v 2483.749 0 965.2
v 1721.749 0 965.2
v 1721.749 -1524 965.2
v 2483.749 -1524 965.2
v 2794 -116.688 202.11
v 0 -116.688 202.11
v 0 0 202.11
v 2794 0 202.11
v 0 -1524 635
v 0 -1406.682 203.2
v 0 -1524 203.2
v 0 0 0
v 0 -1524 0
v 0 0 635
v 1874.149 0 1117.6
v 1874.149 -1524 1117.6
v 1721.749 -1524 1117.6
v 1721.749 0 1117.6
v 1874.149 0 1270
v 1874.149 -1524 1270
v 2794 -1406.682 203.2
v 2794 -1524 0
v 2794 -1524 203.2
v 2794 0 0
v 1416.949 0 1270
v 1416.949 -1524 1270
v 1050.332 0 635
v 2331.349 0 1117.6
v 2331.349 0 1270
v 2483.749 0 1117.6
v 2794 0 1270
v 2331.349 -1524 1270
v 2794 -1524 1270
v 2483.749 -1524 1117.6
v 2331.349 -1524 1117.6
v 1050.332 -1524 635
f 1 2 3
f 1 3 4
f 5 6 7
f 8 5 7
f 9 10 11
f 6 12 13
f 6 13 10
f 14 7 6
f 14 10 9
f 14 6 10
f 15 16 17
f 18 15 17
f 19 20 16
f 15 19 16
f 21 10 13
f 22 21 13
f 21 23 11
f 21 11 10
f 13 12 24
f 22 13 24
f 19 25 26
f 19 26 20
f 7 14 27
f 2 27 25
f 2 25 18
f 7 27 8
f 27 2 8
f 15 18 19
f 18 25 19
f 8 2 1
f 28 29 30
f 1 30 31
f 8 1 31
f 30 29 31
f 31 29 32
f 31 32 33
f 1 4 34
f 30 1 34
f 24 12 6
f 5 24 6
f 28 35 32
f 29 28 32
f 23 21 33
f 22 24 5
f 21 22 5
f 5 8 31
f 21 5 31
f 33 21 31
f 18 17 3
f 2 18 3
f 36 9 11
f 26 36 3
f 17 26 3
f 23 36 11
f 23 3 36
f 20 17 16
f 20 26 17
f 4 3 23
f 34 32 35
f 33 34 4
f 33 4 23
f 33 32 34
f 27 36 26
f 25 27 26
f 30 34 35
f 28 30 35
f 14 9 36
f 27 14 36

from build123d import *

# Parameters (mm, degrees)
F0_W     = 2794
F0_H     = 1270
F1_DEPTH = 1524
F3_DEPTH = 1524.001
F5_DEPTH = 1524.001
F7_DEPTH = 2794.001
F9_DEPTH = 2794.001


with BuildPart() as f1:
    # F0 (on Front) → F1 (new body)
    with BuildSketch(Plane.XZ):
        with Locations((1397, 635)):
            Rectangle(F0_W, F0_H)
    extrude(amount=F1_DEPTH)

    # F2 (on face) → F3 (cut, through all)
    with BuildSketch(Plane.XZ.offset(1524)):
        Polygon((2331.349306, 1270), (1874.149306, 1270), (1874.149306, 1117.6), (1721.749306, 1117.6), (1721.749306, 965.2), (2483.749306, 965.2), (2483.749306, 1117.6), (2331.349306, 1117.6), align=None)
    extrude(amount=-F3_DEPTH, mode=Mode.SUBTRACT)

    # F4 (on face) → F5 (cut, through all)
    with BuildSketch(Plane.XZ.offset(1524)):
        Polygon((1050.331885, 635), (1416.949306, 1270), (0, 1270), (0, 635), align=None)
    extrude(amount=-F5_DEPTH, mode=Mode.SUBTRACT)

    # F6 (on face) → F7 (cut, through all)
    with BuildSketch(Plane(origin=(0, 0, 0), x_dir=(0, -1, 0), z_dir=(-1, 0, 0))):
        Polygon((0, 202.109794), (0, 0), (116.688144, 202.109794), align=None)
    extrude(amount=-F7_DEPTH, mode=Mode.SUBTRACT)

    # F8 (on face) → F9 (cut, through all)
    with BuildSketch(Plane(origin=(0, 0, 0), x_dir=(0, -1, 0), z_dir=(-1, 0, 0))):
        Polygon((1406.682425, 203.2), (1524, 0), (1524, 203.2), align=None)
    extrude(amount=-F9_DEPTH, mode=Mode.SUBTRACT)


solid = f1.part
